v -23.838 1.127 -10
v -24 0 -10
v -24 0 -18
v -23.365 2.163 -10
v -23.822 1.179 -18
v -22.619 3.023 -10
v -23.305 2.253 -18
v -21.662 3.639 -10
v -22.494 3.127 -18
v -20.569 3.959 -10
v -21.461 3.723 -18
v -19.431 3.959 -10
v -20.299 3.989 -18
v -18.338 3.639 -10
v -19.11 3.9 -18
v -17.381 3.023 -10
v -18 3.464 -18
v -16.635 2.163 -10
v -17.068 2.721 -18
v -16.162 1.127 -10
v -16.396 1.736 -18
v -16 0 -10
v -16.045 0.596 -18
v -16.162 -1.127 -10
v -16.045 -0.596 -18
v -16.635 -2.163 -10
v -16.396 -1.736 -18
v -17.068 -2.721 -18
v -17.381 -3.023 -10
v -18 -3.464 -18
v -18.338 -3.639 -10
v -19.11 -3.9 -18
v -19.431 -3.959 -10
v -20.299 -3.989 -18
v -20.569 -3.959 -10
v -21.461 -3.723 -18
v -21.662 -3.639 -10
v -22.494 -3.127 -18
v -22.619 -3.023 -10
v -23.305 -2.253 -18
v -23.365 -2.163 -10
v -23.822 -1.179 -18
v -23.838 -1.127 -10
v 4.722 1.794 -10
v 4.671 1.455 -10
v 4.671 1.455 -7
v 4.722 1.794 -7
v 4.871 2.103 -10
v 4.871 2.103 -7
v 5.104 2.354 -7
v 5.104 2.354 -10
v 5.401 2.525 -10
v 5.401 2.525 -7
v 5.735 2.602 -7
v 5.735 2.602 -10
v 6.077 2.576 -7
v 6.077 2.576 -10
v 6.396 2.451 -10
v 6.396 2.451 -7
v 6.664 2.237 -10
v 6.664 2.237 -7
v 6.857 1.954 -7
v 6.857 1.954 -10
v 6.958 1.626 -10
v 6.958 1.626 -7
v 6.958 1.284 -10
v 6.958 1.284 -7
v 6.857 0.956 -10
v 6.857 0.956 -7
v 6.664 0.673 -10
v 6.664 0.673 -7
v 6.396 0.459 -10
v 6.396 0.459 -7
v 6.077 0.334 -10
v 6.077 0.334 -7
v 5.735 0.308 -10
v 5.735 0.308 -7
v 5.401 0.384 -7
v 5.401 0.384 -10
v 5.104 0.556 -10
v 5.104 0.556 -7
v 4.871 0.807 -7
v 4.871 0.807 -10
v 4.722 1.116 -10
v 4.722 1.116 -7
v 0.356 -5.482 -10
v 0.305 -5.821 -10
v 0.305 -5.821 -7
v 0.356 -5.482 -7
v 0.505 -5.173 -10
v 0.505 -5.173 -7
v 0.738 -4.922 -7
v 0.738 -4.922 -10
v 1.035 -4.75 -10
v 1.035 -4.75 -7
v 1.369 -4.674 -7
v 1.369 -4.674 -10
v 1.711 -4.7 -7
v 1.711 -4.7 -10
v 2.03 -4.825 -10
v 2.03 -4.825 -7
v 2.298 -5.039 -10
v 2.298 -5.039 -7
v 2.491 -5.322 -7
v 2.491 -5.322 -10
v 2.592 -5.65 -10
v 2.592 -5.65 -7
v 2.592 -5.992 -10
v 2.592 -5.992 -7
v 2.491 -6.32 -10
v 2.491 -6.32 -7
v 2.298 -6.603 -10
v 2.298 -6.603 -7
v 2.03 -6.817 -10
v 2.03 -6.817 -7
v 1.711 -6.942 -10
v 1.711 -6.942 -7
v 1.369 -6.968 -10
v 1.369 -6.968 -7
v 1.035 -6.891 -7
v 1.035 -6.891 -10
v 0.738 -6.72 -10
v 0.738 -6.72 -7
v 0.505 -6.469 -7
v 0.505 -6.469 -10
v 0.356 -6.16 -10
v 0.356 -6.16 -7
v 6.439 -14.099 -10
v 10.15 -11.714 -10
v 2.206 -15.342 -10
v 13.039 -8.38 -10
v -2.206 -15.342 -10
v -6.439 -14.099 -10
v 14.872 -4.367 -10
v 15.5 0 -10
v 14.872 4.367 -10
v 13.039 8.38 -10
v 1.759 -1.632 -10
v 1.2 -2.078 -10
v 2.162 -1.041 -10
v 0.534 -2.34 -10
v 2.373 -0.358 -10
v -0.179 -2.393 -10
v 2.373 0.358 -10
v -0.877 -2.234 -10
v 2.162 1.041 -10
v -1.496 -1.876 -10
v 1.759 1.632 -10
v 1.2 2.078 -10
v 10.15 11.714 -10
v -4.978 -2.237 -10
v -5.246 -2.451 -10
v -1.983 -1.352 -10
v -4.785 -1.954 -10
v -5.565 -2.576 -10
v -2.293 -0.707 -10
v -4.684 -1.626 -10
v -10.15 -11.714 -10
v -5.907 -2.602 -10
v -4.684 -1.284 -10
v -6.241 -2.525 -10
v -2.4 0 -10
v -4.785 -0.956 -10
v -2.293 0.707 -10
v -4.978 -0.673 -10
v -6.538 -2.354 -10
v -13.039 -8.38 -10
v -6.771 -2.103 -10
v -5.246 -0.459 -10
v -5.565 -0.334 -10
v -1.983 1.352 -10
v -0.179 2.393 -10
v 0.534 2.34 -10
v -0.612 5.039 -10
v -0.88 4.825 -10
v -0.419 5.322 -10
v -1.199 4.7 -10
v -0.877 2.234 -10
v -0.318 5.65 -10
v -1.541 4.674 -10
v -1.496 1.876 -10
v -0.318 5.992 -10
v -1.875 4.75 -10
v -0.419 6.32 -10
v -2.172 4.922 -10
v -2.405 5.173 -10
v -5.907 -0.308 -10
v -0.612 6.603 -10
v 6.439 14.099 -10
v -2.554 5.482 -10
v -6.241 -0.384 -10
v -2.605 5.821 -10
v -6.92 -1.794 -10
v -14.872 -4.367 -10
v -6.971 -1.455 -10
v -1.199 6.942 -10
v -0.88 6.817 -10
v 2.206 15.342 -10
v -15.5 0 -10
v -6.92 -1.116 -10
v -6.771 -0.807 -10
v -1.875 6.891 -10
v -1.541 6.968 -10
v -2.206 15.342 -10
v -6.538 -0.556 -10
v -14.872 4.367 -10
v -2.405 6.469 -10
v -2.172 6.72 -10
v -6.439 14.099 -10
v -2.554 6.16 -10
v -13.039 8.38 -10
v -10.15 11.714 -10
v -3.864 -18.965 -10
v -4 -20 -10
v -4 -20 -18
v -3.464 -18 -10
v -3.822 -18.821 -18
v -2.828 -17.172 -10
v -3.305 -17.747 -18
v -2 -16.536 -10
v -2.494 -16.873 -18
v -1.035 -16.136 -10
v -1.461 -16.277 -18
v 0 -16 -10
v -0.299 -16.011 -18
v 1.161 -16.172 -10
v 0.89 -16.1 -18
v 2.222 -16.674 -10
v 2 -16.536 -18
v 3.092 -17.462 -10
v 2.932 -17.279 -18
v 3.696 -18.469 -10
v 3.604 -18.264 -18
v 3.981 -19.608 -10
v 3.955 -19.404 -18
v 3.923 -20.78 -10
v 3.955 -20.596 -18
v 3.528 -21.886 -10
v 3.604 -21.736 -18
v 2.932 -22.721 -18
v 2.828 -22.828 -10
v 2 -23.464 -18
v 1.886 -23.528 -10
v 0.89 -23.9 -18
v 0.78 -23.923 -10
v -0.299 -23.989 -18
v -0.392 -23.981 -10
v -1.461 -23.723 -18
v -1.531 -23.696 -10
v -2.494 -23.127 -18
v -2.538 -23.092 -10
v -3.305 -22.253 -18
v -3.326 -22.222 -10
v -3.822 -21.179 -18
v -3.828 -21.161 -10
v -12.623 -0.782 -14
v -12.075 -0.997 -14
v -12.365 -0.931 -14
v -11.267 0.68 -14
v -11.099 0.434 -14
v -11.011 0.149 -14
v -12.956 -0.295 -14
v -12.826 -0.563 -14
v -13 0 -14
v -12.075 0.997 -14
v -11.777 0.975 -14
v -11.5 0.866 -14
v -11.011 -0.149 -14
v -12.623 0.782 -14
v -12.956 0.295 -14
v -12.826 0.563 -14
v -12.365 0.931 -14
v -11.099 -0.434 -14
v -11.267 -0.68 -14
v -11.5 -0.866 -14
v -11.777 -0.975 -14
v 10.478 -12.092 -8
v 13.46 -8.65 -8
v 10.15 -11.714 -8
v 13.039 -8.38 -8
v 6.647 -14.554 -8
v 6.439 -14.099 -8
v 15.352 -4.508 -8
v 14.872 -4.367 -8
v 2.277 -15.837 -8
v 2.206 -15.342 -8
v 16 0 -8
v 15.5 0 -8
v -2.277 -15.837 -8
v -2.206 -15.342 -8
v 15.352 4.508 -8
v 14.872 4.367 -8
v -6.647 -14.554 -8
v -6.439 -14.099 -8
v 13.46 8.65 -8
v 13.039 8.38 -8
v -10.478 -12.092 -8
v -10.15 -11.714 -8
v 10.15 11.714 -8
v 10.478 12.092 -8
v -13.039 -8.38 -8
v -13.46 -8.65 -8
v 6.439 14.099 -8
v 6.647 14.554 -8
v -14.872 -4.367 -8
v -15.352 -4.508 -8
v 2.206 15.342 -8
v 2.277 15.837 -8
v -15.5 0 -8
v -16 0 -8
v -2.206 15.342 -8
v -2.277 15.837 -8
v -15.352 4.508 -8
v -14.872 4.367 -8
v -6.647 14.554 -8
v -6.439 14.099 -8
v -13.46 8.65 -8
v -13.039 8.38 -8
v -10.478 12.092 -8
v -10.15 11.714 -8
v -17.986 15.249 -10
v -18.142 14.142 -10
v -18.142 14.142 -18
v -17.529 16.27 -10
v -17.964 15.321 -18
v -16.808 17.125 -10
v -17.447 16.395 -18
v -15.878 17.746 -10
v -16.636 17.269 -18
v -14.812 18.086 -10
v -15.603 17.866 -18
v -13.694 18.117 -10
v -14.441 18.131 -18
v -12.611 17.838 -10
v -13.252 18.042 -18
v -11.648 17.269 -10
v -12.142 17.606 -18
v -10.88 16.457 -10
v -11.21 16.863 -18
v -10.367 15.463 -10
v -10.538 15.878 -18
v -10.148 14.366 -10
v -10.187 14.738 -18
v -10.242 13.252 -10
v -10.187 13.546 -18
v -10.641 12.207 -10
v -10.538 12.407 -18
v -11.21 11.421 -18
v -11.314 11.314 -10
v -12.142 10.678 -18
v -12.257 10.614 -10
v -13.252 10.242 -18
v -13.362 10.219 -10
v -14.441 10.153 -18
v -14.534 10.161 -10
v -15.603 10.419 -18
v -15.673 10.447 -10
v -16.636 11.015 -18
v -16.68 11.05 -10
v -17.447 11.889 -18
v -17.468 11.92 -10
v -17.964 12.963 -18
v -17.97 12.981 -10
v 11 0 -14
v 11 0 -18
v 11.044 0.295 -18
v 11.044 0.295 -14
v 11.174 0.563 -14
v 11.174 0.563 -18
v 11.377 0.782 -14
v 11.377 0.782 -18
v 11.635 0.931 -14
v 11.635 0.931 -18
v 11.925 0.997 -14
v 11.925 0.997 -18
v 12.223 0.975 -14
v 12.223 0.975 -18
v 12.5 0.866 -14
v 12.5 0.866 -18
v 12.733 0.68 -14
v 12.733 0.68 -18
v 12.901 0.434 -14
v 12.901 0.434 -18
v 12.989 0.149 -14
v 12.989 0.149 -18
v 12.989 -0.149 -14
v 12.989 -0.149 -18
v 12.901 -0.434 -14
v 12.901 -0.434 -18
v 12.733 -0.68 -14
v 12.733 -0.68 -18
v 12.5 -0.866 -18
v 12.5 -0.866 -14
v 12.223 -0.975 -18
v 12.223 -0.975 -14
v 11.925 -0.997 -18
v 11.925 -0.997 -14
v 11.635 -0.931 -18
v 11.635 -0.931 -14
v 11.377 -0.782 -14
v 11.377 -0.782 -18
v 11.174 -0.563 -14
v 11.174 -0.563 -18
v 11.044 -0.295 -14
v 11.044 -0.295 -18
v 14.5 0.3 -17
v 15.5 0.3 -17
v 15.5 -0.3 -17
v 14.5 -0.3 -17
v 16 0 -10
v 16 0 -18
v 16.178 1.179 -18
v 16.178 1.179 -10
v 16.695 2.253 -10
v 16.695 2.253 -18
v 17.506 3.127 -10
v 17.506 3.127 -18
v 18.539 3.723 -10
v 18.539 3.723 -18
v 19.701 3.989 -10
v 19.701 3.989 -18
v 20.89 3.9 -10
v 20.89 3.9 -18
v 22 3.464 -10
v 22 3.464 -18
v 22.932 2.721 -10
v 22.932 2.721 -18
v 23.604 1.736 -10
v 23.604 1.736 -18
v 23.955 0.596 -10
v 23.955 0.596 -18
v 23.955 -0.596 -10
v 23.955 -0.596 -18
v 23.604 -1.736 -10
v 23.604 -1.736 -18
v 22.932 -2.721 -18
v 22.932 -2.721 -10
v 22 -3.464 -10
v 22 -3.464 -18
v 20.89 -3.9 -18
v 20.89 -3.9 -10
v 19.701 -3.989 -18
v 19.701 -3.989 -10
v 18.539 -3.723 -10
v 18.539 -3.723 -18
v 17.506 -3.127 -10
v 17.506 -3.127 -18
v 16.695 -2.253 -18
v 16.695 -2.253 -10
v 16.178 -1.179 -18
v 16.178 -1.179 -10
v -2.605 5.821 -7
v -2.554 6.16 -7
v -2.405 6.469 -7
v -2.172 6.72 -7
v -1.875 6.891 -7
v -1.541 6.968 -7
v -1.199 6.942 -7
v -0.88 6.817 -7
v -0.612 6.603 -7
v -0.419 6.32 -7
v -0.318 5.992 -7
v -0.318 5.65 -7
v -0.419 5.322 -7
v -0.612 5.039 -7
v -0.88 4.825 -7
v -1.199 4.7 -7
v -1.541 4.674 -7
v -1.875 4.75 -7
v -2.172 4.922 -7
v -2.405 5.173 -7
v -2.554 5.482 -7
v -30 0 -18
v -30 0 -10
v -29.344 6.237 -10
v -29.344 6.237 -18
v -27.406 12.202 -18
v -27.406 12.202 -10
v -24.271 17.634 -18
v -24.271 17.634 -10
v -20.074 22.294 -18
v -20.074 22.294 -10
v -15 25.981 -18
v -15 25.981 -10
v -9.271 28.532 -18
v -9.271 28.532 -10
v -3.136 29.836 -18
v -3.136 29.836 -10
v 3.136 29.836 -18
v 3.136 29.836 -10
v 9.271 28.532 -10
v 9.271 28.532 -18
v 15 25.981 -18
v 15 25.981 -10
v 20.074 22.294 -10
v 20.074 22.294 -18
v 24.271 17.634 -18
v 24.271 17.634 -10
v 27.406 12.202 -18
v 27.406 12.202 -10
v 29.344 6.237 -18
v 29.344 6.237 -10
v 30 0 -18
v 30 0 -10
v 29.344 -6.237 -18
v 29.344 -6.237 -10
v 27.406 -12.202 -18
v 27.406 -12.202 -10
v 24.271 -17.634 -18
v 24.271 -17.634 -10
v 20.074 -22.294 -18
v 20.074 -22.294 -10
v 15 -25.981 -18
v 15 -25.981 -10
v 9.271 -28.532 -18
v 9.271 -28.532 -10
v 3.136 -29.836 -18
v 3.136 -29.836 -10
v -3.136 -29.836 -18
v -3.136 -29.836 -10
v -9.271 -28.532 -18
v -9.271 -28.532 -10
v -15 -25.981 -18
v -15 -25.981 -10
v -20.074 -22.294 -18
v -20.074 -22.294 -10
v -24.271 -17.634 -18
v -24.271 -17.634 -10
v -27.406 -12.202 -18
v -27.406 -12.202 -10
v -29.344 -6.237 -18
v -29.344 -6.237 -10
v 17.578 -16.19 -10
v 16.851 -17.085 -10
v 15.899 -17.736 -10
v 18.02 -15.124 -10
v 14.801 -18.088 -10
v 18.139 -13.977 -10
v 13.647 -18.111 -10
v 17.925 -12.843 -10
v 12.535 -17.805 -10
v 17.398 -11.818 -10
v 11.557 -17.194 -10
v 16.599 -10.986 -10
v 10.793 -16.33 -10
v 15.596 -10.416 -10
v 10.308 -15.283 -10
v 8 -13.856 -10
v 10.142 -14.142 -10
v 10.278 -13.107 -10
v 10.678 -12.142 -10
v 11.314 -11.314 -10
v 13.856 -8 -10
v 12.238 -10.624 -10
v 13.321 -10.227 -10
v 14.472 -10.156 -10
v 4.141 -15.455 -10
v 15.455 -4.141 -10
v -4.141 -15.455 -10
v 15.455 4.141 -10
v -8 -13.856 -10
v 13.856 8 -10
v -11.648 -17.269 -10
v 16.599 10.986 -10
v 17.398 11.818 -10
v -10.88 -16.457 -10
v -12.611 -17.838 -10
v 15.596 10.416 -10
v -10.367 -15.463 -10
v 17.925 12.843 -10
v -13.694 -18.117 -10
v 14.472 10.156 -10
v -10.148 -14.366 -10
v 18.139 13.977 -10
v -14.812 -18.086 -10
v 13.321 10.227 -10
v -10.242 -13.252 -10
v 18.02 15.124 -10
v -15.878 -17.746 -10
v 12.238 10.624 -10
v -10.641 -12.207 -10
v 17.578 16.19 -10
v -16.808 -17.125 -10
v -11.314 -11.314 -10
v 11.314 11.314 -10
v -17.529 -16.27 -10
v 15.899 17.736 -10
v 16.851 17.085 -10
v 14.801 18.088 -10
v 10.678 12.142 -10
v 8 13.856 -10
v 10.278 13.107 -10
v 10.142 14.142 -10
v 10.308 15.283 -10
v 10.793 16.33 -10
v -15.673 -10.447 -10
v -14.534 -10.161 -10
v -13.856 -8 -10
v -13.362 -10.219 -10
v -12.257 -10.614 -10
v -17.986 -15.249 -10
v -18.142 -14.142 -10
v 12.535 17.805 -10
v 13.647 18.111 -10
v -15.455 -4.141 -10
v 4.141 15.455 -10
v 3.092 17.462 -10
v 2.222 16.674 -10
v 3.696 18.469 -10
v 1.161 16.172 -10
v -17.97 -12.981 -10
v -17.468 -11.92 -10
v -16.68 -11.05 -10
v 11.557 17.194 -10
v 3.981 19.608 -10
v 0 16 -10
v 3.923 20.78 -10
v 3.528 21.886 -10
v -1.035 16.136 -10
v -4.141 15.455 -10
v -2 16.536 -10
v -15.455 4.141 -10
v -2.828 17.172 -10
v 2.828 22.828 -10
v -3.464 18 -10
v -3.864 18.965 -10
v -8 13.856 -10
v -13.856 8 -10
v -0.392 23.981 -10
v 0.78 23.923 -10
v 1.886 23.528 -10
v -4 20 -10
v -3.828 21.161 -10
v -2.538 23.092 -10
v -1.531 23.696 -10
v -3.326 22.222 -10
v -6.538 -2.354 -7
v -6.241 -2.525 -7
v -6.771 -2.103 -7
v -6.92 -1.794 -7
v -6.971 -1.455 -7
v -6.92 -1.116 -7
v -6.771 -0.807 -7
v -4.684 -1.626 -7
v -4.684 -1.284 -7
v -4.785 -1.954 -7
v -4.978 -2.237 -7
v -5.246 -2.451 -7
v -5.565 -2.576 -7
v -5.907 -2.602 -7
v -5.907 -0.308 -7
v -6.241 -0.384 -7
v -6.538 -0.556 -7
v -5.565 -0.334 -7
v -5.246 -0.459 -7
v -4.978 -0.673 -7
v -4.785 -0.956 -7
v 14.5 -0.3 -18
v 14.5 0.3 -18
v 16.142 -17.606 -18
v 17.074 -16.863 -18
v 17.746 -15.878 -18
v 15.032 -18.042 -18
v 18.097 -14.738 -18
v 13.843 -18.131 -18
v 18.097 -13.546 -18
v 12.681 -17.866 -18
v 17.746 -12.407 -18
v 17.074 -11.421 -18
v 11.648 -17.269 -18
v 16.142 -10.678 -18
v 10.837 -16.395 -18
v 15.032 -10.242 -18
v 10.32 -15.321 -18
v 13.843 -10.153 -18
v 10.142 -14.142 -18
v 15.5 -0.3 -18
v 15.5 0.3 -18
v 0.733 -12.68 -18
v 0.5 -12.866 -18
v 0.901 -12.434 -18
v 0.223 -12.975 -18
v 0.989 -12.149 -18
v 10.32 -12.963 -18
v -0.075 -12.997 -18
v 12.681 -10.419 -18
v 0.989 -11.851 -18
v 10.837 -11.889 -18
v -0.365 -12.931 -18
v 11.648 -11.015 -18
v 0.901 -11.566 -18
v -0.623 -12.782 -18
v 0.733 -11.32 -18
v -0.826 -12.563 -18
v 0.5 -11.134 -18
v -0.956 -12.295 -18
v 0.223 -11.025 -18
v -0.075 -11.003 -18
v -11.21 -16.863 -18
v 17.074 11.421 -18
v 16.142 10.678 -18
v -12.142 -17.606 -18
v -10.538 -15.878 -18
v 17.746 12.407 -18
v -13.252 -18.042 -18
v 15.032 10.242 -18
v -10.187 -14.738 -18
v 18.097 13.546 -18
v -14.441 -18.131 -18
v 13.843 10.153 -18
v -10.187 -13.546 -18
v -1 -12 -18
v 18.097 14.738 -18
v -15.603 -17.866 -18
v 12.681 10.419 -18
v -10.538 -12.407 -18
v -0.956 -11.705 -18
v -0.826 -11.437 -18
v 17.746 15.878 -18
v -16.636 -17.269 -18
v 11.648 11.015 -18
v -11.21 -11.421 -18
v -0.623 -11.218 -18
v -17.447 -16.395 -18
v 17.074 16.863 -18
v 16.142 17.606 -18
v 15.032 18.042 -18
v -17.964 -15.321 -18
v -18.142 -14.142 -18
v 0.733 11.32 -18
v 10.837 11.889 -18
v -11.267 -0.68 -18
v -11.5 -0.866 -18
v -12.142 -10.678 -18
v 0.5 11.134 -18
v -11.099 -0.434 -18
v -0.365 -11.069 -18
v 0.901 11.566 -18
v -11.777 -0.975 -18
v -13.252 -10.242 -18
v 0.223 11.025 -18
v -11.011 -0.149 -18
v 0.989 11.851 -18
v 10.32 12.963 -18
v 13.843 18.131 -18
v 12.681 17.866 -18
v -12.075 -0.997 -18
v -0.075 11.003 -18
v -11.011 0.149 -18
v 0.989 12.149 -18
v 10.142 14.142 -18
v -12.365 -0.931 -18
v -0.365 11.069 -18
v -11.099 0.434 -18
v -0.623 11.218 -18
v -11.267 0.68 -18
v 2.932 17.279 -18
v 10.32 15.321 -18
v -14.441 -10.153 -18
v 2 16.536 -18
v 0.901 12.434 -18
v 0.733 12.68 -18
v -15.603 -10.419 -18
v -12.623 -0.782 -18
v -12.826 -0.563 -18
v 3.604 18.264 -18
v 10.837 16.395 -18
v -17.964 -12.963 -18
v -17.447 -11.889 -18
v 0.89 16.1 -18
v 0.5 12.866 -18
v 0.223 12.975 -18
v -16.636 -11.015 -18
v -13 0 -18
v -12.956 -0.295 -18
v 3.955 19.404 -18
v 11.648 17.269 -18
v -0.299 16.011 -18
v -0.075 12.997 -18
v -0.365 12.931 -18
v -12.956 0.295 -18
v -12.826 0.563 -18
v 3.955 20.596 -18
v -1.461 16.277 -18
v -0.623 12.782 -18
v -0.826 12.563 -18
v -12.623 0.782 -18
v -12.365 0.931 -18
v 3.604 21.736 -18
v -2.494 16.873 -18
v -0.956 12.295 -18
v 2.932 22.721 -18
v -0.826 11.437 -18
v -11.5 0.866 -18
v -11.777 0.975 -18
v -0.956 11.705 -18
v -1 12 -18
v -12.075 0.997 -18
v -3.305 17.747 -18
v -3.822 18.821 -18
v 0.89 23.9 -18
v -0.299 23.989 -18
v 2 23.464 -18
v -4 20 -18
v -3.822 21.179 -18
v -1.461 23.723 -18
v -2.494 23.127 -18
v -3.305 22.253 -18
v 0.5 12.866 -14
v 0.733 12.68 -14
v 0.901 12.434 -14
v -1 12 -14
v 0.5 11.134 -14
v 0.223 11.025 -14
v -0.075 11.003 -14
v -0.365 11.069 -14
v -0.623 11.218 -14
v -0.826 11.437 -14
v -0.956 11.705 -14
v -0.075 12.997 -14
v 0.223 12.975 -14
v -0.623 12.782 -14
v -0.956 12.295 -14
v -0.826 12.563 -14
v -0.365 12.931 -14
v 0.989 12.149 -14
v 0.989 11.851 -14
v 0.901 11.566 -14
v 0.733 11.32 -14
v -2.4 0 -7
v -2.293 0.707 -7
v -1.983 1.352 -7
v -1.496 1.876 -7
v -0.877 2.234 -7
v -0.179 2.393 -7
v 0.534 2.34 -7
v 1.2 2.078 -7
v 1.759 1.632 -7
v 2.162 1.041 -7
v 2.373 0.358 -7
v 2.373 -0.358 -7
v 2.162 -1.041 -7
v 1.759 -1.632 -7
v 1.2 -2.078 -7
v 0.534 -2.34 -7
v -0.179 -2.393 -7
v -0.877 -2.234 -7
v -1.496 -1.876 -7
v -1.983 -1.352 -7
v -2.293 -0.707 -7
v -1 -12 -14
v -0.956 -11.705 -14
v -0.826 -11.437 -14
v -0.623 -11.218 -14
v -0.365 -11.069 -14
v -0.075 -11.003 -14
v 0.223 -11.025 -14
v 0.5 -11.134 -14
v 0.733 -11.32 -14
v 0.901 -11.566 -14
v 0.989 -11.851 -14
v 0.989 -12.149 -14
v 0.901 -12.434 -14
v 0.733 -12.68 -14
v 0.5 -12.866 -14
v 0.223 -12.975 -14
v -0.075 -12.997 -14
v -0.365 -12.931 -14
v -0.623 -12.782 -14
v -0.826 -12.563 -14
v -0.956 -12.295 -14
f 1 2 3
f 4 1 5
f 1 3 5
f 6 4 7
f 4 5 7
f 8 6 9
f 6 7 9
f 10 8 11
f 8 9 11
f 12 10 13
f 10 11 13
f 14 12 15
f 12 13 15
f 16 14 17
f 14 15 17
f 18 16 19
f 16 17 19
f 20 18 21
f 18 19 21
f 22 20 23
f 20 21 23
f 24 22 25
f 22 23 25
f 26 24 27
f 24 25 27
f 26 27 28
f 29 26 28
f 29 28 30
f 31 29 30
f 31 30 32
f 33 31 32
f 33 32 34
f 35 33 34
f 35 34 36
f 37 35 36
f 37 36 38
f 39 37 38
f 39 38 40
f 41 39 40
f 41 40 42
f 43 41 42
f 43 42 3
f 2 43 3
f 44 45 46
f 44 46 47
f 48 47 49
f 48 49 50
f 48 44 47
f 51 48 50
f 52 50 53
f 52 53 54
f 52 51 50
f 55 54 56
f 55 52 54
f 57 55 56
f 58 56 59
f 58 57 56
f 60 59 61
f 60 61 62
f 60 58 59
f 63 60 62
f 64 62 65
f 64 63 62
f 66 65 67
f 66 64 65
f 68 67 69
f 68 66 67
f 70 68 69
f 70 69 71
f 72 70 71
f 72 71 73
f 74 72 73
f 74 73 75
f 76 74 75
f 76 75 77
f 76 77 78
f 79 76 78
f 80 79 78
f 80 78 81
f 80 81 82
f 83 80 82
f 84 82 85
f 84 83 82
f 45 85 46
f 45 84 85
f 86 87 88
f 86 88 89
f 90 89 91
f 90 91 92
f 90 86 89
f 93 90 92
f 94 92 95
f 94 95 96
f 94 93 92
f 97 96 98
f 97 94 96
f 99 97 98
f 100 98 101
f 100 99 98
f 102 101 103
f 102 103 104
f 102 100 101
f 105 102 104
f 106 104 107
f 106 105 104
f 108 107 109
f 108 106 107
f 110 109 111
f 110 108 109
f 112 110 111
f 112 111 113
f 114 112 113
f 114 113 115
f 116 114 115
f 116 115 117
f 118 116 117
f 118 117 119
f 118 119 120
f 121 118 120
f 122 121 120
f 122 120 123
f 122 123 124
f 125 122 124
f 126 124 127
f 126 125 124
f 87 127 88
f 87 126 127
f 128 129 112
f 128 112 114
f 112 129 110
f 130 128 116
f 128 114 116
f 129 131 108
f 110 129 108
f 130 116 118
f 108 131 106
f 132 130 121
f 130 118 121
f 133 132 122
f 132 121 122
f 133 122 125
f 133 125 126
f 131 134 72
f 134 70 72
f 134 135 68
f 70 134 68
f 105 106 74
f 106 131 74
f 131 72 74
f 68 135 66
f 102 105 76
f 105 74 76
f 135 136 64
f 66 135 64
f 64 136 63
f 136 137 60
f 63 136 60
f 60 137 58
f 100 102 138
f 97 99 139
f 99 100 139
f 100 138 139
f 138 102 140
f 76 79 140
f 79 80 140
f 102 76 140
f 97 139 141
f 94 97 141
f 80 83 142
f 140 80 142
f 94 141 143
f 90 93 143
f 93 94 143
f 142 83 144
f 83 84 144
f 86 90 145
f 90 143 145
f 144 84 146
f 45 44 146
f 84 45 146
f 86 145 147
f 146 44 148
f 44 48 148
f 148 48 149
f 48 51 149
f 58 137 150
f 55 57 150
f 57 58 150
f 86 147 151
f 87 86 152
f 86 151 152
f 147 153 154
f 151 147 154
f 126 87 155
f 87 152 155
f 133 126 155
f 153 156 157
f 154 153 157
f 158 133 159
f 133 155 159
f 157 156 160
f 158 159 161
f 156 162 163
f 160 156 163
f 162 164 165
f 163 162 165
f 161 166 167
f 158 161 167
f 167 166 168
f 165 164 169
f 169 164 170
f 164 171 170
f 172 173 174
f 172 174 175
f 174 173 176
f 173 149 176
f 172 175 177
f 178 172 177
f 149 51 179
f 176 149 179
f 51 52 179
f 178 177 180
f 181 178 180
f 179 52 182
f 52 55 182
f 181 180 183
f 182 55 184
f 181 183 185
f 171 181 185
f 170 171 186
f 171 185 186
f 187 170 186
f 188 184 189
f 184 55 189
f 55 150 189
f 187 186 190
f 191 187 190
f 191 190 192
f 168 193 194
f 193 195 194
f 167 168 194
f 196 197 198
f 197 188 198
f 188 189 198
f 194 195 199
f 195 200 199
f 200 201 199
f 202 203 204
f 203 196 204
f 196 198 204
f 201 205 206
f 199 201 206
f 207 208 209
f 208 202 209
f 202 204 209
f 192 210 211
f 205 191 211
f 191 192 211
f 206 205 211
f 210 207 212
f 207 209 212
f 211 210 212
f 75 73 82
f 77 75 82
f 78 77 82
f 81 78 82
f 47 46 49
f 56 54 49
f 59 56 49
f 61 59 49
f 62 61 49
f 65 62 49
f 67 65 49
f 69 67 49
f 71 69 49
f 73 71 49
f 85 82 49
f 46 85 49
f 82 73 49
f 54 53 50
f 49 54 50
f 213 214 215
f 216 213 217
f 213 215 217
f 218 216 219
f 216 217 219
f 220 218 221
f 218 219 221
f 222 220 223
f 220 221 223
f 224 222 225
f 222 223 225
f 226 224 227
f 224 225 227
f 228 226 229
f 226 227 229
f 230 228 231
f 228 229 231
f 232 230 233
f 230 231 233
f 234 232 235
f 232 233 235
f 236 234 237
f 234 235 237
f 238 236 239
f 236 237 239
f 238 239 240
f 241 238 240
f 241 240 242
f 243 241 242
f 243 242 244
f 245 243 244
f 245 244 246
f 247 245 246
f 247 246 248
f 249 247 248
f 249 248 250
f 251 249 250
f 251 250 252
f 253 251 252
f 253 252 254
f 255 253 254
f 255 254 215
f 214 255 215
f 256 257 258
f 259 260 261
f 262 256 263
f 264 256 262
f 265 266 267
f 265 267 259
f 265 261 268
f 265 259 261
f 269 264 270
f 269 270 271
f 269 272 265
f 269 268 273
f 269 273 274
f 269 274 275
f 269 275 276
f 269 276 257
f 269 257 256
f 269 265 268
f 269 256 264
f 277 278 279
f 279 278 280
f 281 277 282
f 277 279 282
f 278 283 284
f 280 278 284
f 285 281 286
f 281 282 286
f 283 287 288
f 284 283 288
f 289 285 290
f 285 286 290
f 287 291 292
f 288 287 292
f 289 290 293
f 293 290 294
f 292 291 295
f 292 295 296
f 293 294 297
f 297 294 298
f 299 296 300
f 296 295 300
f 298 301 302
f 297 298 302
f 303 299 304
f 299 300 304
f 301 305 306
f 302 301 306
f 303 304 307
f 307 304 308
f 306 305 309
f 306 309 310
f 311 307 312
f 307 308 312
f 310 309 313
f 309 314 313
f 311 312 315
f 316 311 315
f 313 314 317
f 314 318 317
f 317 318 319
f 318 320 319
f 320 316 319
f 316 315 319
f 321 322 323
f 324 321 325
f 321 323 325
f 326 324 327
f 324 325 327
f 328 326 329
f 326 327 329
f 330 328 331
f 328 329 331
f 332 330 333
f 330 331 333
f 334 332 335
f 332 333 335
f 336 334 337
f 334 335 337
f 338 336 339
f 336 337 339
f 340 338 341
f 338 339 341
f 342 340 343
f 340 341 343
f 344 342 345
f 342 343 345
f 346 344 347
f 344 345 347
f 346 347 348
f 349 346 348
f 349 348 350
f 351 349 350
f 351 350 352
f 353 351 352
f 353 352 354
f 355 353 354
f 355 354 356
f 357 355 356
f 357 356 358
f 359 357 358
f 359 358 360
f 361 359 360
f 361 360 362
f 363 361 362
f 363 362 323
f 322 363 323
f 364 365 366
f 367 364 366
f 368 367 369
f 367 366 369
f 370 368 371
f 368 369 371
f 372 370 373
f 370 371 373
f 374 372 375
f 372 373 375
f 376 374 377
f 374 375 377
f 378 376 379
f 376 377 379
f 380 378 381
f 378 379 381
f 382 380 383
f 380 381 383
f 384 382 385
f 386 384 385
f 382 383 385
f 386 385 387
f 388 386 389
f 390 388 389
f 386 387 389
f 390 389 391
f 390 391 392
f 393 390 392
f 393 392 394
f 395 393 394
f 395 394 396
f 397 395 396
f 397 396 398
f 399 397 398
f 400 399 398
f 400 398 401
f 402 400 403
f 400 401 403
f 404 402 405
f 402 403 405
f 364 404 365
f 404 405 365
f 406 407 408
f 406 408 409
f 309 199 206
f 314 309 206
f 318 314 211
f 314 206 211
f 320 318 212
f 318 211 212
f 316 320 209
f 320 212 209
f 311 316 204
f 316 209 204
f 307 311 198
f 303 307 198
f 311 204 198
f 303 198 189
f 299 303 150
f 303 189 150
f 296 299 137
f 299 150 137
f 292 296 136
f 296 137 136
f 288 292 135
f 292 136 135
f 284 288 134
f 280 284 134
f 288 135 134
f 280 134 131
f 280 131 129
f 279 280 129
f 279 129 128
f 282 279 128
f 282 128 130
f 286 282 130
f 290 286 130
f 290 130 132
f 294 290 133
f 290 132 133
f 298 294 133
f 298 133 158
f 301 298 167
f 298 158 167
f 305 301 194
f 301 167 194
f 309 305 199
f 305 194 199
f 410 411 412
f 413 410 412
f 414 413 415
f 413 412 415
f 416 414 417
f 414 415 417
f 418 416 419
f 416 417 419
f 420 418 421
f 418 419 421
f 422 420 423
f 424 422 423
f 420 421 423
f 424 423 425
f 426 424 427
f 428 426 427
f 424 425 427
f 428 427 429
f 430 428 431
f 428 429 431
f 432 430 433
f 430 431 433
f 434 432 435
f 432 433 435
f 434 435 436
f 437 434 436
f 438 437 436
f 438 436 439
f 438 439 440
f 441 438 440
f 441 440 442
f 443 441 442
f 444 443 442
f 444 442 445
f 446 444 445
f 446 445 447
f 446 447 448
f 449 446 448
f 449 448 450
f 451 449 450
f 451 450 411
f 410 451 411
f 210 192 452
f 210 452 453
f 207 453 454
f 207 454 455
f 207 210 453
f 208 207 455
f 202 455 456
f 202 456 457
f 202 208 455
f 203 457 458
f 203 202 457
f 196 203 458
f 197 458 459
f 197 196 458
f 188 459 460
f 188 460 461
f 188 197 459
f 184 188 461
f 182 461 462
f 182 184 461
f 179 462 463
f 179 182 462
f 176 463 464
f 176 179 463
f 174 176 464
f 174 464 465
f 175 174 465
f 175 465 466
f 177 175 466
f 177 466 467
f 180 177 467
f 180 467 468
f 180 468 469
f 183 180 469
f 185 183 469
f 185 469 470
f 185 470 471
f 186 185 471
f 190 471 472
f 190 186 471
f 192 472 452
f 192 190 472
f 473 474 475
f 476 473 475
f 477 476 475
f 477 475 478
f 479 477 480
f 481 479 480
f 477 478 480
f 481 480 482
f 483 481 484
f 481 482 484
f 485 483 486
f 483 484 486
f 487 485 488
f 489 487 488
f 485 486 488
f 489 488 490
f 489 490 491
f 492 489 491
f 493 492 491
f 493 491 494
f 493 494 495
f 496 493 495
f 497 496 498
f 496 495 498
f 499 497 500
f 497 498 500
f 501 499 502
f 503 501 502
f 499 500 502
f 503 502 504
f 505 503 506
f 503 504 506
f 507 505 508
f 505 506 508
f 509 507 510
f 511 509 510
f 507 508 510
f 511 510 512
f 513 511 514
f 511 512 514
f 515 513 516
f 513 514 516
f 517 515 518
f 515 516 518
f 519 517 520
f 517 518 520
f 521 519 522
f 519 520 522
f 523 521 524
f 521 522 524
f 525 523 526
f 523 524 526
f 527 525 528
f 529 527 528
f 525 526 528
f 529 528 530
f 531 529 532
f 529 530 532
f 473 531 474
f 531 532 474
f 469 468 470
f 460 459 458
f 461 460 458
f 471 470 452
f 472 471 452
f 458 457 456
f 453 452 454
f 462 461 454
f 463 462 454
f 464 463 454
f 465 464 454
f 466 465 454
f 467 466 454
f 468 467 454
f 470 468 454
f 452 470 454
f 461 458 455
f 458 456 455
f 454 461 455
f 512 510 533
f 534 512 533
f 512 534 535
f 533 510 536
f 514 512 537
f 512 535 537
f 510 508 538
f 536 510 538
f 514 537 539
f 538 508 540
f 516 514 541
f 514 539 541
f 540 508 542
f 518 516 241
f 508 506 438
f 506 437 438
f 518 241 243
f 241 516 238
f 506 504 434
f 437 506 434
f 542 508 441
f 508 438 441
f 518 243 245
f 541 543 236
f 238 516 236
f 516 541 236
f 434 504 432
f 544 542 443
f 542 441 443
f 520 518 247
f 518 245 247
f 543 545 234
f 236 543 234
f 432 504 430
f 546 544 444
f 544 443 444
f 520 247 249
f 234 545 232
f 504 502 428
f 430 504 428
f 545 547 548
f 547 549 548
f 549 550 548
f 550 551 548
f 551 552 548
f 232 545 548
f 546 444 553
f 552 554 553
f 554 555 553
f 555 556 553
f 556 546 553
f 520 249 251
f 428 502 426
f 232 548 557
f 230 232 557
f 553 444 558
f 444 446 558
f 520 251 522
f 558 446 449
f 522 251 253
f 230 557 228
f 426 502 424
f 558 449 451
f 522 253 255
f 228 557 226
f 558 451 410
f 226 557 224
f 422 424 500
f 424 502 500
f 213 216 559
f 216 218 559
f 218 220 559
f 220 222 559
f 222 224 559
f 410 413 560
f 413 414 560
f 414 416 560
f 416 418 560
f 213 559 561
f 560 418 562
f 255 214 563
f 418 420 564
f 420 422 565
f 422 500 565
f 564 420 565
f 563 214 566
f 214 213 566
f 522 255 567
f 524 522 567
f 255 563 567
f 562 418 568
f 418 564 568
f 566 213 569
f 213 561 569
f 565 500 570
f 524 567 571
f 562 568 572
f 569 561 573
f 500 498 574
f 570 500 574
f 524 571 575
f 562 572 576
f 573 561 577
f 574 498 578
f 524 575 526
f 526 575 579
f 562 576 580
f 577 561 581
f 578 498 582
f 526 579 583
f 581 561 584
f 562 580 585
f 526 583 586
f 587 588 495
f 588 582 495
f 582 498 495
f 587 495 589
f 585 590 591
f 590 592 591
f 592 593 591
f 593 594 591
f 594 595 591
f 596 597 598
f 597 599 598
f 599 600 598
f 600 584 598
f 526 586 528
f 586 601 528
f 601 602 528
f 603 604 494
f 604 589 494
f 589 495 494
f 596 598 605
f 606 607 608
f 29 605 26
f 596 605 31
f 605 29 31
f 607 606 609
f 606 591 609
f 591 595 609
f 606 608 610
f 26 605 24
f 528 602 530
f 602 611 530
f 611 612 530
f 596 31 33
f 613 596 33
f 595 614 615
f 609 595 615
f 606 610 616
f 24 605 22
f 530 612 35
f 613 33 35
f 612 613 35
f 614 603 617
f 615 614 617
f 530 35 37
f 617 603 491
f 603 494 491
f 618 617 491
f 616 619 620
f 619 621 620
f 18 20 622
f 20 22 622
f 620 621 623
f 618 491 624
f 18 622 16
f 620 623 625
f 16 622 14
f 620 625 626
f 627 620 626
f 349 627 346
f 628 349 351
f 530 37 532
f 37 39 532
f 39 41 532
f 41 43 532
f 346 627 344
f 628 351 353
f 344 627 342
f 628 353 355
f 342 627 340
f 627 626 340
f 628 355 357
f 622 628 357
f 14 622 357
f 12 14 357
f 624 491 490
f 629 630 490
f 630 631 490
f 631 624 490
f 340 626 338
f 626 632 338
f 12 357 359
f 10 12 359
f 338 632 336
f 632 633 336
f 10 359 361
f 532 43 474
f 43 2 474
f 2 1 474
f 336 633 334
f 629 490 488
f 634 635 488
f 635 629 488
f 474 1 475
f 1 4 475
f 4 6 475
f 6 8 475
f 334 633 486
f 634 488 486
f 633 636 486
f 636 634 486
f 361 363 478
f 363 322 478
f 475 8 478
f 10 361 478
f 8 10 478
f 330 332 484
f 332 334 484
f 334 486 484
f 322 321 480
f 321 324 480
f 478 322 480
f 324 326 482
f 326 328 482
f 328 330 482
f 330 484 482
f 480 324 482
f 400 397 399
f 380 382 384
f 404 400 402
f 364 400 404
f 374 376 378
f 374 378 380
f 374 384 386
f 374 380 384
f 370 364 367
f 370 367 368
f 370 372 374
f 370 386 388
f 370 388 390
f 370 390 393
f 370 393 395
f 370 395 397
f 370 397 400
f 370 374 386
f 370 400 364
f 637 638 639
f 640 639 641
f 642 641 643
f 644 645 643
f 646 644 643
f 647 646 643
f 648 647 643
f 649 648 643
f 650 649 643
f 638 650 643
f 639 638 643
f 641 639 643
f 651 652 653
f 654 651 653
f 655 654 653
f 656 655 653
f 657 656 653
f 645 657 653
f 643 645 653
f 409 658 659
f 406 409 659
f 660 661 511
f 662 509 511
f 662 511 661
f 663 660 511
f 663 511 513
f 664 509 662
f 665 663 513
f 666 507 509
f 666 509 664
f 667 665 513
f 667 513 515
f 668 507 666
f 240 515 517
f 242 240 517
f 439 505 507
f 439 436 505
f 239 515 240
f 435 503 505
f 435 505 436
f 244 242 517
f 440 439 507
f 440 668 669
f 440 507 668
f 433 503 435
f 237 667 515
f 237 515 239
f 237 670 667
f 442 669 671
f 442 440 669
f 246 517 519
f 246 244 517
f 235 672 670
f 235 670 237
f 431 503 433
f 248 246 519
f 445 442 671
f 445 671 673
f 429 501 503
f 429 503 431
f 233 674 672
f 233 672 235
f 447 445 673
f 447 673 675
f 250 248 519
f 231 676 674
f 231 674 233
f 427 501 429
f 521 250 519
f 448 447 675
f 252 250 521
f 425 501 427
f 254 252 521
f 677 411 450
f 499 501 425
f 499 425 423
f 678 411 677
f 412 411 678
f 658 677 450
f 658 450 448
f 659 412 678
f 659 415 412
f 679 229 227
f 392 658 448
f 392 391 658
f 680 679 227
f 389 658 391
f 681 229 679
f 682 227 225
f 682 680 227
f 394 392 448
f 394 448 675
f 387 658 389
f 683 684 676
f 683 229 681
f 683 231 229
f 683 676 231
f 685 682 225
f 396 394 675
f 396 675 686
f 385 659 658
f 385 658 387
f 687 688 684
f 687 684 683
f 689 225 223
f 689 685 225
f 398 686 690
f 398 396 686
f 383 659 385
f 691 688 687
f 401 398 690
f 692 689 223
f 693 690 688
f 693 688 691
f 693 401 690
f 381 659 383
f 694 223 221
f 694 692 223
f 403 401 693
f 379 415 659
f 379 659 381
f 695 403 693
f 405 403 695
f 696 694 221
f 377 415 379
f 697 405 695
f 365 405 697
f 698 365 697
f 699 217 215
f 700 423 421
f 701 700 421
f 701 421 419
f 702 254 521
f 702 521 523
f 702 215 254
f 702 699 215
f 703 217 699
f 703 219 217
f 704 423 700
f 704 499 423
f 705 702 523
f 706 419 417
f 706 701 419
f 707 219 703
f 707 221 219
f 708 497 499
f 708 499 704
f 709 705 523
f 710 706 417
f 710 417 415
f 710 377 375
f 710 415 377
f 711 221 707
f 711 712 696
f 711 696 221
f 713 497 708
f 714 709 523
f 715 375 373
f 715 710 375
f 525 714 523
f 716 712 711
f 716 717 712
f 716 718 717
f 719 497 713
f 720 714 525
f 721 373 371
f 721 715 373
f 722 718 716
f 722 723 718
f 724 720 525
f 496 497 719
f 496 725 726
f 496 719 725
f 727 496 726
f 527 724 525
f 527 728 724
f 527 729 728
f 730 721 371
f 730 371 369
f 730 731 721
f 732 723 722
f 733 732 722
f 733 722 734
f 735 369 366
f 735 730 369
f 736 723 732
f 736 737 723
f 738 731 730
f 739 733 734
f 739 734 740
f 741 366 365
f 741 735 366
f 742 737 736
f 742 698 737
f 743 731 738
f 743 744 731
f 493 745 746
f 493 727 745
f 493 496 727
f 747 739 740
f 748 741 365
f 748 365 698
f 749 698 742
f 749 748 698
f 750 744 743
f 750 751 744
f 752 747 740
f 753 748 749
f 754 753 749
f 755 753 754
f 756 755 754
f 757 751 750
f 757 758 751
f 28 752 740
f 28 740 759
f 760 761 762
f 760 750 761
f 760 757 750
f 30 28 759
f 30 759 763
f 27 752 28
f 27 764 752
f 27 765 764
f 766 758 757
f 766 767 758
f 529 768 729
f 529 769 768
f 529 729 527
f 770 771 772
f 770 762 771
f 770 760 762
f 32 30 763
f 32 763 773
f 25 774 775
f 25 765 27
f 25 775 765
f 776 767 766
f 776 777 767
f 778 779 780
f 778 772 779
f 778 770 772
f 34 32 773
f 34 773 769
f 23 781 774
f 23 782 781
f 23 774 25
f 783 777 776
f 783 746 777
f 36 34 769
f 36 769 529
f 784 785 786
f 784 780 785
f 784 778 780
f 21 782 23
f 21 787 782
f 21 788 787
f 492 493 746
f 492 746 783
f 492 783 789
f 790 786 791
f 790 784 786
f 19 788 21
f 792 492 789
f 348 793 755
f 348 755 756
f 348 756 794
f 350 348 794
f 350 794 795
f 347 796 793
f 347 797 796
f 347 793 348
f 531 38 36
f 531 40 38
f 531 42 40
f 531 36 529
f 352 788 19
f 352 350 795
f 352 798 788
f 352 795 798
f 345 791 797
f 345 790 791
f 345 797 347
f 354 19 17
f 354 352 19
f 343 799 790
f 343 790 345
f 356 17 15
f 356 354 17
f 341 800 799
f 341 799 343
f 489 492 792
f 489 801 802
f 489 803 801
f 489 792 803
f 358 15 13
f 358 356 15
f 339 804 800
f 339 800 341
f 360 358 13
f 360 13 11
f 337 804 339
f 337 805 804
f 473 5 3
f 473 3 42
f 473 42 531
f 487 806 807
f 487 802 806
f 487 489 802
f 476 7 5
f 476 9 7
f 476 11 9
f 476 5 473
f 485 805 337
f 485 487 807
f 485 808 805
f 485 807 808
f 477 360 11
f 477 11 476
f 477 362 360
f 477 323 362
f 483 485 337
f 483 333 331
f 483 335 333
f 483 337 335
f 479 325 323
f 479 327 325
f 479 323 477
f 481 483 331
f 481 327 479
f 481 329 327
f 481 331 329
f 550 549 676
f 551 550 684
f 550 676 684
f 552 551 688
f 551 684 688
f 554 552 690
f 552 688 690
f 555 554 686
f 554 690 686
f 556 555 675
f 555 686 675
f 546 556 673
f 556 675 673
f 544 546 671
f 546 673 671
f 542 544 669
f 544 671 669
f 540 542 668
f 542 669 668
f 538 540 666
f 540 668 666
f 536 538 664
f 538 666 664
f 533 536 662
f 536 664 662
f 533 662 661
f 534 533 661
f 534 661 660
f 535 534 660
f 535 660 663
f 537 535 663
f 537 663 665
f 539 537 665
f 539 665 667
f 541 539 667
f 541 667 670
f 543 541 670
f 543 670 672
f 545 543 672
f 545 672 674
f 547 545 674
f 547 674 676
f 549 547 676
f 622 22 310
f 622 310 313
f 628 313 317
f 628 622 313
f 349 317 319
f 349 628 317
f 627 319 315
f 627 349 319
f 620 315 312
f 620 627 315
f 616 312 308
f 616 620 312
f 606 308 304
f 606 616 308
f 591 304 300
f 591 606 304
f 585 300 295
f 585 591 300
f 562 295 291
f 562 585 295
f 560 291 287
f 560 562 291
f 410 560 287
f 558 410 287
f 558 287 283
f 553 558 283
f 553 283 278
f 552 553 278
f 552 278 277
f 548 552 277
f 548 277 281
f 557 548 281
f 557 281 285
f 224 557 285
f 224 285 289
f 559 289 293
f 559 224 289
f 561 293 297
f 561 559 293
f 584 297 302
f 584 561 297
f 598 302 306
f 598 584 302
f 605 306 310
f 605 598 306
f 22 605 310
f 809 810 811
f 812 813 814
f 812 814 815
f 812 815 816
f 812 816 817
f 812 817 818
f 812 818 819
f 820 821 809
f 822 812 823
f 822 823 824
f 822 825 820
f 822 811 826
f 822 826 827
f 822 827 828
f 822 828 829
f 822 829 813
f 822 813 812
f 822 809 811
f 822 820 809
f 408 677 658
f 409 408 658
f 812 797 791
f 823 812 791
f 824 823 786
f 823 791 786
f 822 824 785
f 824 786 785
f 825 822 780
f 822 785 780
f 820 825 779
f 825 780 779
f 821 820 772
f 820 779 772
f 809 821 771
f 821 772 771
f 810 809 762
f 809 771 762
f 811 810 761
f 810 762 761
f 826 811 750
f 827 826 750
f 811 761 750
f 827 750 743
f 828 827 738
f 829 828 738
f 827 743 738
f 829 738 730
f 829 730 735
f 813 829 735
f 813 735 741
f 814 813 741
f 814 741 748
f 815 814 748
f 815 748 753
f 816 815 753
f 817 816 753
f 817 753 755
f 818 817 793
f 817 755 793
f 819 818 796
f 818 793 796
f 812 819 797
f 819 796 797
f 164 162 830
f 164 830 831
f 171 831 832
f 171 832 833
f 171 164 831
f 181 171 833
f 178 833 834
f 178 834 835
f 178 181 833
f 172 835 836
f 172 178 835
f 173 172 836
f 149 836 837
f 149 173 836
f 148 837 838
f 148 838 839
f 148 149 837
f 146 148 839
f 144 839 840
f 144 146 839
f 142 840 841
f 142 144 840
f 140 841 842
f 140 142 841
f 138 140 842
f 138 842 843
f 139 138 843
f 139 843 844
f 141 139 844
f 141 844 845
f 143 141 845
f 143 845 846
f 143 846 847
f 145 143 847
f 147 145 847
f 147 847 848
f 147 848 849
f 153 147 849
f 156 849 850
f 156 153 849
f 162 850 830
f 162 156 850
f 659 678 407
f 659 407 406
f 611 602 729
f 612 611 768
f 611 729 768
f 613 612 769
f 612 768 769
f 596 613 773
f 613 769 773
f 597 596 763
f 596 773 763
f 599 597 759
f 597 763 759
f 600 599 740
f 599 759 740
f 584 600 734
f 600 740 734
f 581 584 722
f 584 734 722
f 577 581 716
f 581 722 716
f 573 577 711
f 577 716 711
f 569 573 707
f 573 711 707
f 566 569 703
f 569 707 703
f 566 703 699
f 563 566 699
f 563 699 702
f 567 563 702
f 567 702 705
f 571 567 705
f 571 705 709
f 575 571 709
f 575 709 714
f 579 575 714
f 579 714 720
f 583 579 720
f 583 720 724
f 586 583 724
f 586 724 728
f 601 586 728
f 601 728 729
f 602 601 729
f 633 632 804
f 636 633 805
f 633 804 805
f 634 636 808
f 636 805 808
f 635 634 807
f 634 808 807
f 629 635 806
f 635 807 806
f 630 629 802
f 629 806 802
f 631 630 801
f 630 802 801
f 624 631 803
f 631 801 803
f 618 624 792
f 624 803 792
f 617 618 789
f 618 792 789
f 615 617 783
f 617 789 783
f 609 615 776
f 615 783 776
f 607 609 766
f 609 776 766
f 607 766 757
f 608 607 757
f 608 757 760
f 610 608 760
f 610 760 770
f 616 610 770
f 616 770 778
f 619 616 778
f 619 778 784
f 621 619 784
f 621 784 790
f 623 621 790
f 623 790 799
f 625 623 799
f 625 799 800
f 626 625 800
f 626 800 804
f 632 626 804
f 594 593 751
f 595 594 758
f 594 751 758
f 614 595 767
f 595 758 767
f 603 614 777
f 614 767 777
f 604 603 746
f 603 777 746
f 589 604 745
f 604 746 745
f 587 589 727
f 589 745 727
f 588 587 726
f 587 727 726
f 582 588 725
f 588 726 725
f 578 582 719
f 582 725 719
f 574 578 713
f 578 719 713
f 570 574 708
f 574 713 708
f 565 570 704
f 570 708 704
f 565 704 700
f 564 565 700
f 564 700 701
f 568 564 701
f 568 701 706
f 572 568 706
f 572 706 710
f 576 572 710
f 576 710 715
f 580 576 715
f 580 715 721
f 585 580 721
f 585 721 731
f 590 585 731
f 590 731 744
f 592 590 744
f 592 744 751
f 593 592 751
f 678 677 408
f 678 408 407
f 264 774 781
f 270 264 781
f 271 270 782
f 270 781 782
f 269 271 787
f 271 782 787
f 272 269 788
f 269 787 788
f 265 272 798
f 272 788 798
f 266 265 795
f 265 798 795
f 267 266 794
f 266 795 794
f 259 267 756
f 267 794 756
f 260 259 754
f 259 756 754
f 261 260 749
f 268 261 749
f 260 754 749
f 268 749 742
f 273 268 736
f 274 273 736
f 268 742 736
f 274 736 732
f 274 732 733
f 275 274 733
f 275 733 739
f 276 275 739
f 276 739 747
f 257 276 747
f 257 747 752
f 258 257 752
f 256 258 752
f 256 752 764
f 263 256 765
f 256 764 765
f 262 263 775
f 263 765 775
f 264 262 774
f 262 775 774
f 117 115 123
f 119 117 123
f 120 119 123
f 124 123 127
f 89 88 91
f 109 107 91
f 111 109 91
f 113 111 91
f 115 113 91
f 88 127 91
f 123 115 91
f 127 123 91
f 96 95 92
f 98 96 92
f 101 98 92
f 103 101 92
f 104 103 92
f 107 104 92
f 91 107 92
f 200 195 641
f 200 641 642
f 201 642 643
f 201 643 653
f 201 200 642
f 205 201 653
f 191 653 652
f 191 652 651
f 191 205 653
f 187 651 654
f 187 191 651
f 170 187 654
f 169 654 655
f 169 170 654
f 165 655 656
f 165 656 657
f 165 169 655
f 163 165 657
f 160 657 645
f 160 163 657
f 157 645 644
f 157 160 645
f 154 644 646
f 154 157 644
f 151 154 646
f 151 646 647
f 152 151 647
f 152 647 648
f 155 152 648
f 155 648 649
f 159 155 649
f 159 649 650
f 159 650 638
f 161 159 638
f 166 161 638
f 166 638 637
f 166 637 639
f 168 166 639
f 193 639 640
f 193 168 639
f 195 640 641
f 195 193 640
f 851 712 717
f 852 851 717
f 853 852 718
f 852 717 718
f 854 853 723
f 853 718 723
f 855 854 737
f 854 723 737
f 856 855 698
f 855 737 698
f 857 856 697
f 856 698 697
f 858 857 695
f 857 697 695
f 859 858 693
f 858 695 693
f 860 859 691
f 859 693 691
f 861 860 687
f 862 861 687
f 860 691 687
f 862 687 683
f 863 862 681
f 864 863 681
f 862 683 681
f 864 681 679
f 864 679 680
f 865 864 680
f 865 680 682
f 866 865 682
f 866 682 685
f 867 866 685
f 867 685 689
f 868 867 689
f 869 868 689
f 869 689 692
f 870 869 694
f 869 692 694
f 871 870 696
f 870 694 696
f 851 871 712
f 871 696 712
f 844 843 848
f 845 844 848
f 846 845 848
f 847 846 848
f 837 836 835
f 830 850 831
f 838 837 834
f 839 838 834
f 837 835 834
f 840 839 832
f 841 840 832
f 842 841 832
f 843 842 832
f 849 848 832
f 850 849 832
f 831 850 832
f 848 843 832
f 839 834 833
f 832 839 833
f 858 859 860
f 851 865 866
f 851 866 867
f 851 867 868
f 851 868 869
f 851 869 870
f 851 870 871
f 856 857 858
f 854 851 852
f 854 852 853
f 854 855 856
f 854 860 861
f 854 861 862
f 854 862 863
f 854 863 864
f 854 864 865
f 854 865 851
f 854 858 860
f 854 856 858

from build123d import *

# Parameters (mm, degrees)
SKETCH_2_R          = 2.4
EXTRUDE_1_DEPTH     = 3
SKETCH_3_R          = 1.15
EXTRUDE_2_DEPTH     = 3
EXTRUDE_2_2_DEPTH   = 3
EXTRUDE_2_3_DEPTH   = 3
EXTRUDE_2_4_DEPTH   = 3
SKETCH_4_R          = 16
SKETCH_4_R_2        = 15.5
EXTRUDE_3_DEPTH     = 2
SKETCH_5_R          = 30
EXTRUDE_4_DEPTH     = 8
CUT_EXTRUDE_1_REACH = 45.829
SKETCH_6_R          = 4
SKETCH_7_R          = 1
CUT_EXTRUDE_2_DEPTH = 4
SKETCH_9_W          = 1
SKETCH_9_H          = 0.6
CUT_EXTRUDE_3_DEPTH = 1


with BuildPart() as part:
    # 草图2 → 凸台-拉伸1 (new body)
    with BuildSketch(Plane(origin=(0, 0, -10), x_dir=(-1, 0, 0), z_dir=(0, 0, -1))):
        Circle(SKETCH_2_R)
    extrude(amount=-EXTRUDE_1_DEPTH)



with BuildPart() as body_2:
    # 草图3 → 凸台-拉伸2 (new body)
    with BuildSketch(Plane(origin=(0, 0, -10), x_dir=(-1, 0, 0), z_dir=(0, 0, -1))):
        with Locations((5.820917719, -1.454962857)):
            Circle(SKETCH_3_R)
    extrude(amount=-EXTRUDE_2_DEPTH)


with BuildPart() as body_3:
    # 草图3 → Extrude 2 2 (new body)
    with BuildSketch(Plane(origin=(0, 0, -10), x_dir=(-1, 0, 0), z_dir=(0, 0, -1))):
        with Locations((-1.454962857, -5.820917719)):
            Circle(SKETCH_3_R)
    extrude(amount=-EXTRUDE_2_2_DEPTH)


with BuildPart() as body_4:
    # 草图3 → Extrude 2 3 (new body)
    with BuildSketch(Plane(origin=(0, 0, -10), x_dir=(-1, 0, 0), z_dir=(0, 0, -1))):
        with Locations((-5.820917719, 1.454962857)):
            Circle(SKETCH_3_R)
    extrude(amount=-EXTRUDE_2_3_DEPTH)


with BuildPart() as body_5:
    # 草图3 → Extrude 2 4 (new body)
    with BuildSketch(Plane(origin=(0, 0, -10), x_dir=(-1, 0, 0), z_dir=(0, 0, -1))):
        with Locations((1.454962857, 5.820917719)):
            Circle(SKETCH_3_R)
    extrude(amount=-EXTRUDE_2_4_DEPTH)


with BuildPart() as body_6:
    # 草图4 → 凸台-拉伸3 (new body)
    with BuildSketch(Plane(origin=(0, 0, -10), x_dir=(-1, 0, 0), z_dir=(0, 0, -1))):
        Circle(SKETCH_4_R)
        Circle(SKETCH_4_R_2, mode=Mode.SUBTRACT)
    extrude(amount=-EXTRUDE_3_DEPTH)


with BuildPart() as part_1:
    add(part.part)

    add(body_2.part)  # 凸台-拉伸4 merges body 2

    add(body_3.part)  # 凸台-拉伸4 merges body 3

    add(body_4.part)  # 凸台-拉伸4 merges body 4

    add(body_5.part)  # 凸台-拉伸4 merges body 5

    add(body_6.part)  # 凸台-拉伸4 merges body 6
    # 草图5 → 凸台-拉伸4 (add)
    with BuildSketch(Plane(origin=(0, 0, -10), x_dir=(-1, 0, 0), z_dir=(0, 0, -1))):
        Circle(SKETCH_5_R)
    extrude(amount=EXTRUDE_4_DEPTH)

    # 草图6 → 切除-拉伸1 (cut, up to next)
    with BuildSketch(Plane(origin=(0, 0, -18), x_dir=(-1, 0, 0), z_dir=(0, 0, -1)), mode=Mode.PRIVATE) as cut_extrude_1_sk1:
        with Locations((0, -20)):
            Circle(SKETCH_6_R)
    cut_extrude_1_tool1 = extrude(cut_extrude_1_sk1.sketch, amount=-CUT_EXTRUDE_1_REACH, mode=Mode.PRIVATE) & part_1.part
    # 草图6 → 切除-拉伸1 (cut, up to next)
    with BuildSketch(Plane(origin=(0, 0, -18), x_dir=(-1, 0, 0), z_dir=(0, 0, -1)), mode=Mode.PRIVATE) as cut_extrude_1_sk2:
        with Locations((-14.142135624, -14.142135624)):
            Circle(SKETCH_6_R)
    cut_extrude_1_tool2 = extrude(cut_extrude_1_sk2.sketch, amount=-CUT_EXTRUDE_1_REACH, mode=Mode.PRIVATE) & part_1.part
    # 草图6 → 切除-拉伸1 (cut, up to next)
    with BuildSketch(Plane(origin=(0, 0, -18), x_dir=(-1, 0, 0), z_dir=(0, 0, -1)), mode=Mode.PRIVATE) as cut_extrude_1_sk3:
        with Locations((-20, 0)):
            Circle(SKETCH_6_R)
    cut_extrude_1_tool3 = extrude(cut_extrude_1_sk3.sketch, amount=-CUT_EXTRUDE_1_REACH, mode=Mode.PRIVATE) & part_1.part
    # 草图6 → 切除-拉伸1 (cut, up to next)
    with BuildSketch(Plane(origin=(0, 0, -18), x_dir=(-1, 0, 0), z_dir=(0, 0, -1)), mode=Mode.PRIVATE) as cut_extrude_1_sk4:
        with Locations((-14.142135624, 14.142135624)):
            Circle(SKETCH_6_R)
    cut_extrude_1_tool4 = extrude(cut_extrude_1_sk4.sketch, amount=-CUT_EXTRUDE_1_REACH, mode=Mode.PRIVATE) & part_1.part
    # 草图6 → 切除-拉伸1 (cut, up to next)
    with BuildSketch(Plane(origin=(0, 0, -18), x_dir=(-1, 0, 0), z_dir=(0, 0, -1)), mode=Mode.PRIVATE) as cut_extrude_1_sk5:
        with Locations((0, 20)):
            Circle(SKETCH_6_R)
    cut_extrude_1_tool5 = extrude(cut_extrude_1_sk5.sketch, amount=-CUT_EXTRUDE_1_REACH, mode=Mode.PRIVATE) & part_1.part
    # 草图6 → 切除-拉伸1 (cut, up to next)
    with BuildSketch(Plane(origin=(0, 0, -18), x_dir=(-1, 0, 0), z_dir=(0, 0, -1)), mode=Mode.PRIVATE) as cut_extrude_1_sk6:
        with Locations((14.142135624, 14.142135624)):
            Circle(SKETCH_6_R)
    cut_extrude_1_tool6 = extrude(cut_extrude_1_sk6.sketch, amount=-CUT_EXTRUDE_1_REACH, mode=Mode.PRIVATE) & part_1.part
    # 草图6 → 切除-拉伸1 (cut, up to next)
    with BuildSketch(Plane(origin=(0, 0, -18), x_dir=(-1, 0, 0), z_dir=(0, 0, -1)), mode=Mode.PRIVATE) as cut_extrude_1_sk7:
        with Locations((20, 0)):
            Circle(SKETCH_6_R)
    cut_extrude_1_tool7 = extrude(cut_extrude_1_sk7.sketch, amount=-CUT_EXTRUDE_1_REACH, mode=Mode.PRIVATE) & part_1.part
    # 草图6 → 切除-拉伸1 (cut, up to next)
    with BuildSketch(Plane(origin=(0, 0, -18), x_dir=(-1, 0, 0), z_dir=(0, 0, -1)), mode=Mode.PRIVATE) as cut_extrude_1_sk8:
        with Locations((14.142135624, -14.142135624)):
            Circle(SKETCH_6_R)
    cut_extrude_1_tool8 = extrude(cut_extrude_1_sk8.sketch, amount=-CUT_EXTRUDE_1_REACH, mode=Mode.PRIVATE) & part_1.part
    add(cut_extrude_1_tool1.solids().sort_by_distance((0, -20, -18))[0], mode=Mode.SUBTRACT)
    add(cut_extrude_1_tool2.solids().sort_by_distance((14.142136, -14.142136, -18))[0], mode=Mode.SUBTRACT)
    add(cut_extrude_1_tool3.solids().sort_by_distance((20, 0, -18))[0], mode=Mode.SUBTRACT)
    add(cut_extrude_1_tool4.solids().sort_by_distance((14.142136, 14.142136, -18))[0], mode=Mode.SUBTRACT)
    add(cut_extrude_1_tool5.solids().sort_by_distance((0, 20, -18))[0], mode=Mode.SUBTRACT)
    add(cut_extrude_1_tool6.solids().sort_by_distance((-14.142136, 14.142136, -18))[0], mode=Mode.SUBTRACT)
    add(cut_extrude_1_tool7.solids().sort_by_distance((-20, 0, -18))[0], mode=Mode.SUBTRACT)
    add(cut_extrude_1_tool8.solids().sort_by_distance((-14.142136, -14.142136, -18))[0], mode=Mode.SUBTRACT)

    # 草图7 → 切除-拉伸2 (cut)
    with BuildSketch(Plane(origin=(0, 0, -18), x_dir=(-1, 0, 0), z_dir=(0, 0, -1))):
        with Locations((12, 0)):
            Circle(SKETCH_7_R)
        with Locations((0, 12)):
            Circle(SKETCH_7_R)
        with Locations((-12, 0)):
            Circle(SKETCH_7_R)
        with Locations((0, -12)):
            Circle(SKETCH_7_R)
    extrude(amount=-CUT_EXTRUDE_2_DEPTH, mode=Mode.SUBTRACT)

    # 草图9 → 切除-拉伸3 (cut)
    with BuildSketch(Plane(origin=(0, 0, -18), x_dir=(-1, 0, 0), z_dir=(0, 0, -1))):
        with Locations((-15, 0)):
            Rectangle(SKETCH_9_W, SKETCH_9_H)
    extrude(amount=-CUT_EXTRUDE_3_DEPTH, mode=Mode.SUBTRACT)


solid = part_1.part
